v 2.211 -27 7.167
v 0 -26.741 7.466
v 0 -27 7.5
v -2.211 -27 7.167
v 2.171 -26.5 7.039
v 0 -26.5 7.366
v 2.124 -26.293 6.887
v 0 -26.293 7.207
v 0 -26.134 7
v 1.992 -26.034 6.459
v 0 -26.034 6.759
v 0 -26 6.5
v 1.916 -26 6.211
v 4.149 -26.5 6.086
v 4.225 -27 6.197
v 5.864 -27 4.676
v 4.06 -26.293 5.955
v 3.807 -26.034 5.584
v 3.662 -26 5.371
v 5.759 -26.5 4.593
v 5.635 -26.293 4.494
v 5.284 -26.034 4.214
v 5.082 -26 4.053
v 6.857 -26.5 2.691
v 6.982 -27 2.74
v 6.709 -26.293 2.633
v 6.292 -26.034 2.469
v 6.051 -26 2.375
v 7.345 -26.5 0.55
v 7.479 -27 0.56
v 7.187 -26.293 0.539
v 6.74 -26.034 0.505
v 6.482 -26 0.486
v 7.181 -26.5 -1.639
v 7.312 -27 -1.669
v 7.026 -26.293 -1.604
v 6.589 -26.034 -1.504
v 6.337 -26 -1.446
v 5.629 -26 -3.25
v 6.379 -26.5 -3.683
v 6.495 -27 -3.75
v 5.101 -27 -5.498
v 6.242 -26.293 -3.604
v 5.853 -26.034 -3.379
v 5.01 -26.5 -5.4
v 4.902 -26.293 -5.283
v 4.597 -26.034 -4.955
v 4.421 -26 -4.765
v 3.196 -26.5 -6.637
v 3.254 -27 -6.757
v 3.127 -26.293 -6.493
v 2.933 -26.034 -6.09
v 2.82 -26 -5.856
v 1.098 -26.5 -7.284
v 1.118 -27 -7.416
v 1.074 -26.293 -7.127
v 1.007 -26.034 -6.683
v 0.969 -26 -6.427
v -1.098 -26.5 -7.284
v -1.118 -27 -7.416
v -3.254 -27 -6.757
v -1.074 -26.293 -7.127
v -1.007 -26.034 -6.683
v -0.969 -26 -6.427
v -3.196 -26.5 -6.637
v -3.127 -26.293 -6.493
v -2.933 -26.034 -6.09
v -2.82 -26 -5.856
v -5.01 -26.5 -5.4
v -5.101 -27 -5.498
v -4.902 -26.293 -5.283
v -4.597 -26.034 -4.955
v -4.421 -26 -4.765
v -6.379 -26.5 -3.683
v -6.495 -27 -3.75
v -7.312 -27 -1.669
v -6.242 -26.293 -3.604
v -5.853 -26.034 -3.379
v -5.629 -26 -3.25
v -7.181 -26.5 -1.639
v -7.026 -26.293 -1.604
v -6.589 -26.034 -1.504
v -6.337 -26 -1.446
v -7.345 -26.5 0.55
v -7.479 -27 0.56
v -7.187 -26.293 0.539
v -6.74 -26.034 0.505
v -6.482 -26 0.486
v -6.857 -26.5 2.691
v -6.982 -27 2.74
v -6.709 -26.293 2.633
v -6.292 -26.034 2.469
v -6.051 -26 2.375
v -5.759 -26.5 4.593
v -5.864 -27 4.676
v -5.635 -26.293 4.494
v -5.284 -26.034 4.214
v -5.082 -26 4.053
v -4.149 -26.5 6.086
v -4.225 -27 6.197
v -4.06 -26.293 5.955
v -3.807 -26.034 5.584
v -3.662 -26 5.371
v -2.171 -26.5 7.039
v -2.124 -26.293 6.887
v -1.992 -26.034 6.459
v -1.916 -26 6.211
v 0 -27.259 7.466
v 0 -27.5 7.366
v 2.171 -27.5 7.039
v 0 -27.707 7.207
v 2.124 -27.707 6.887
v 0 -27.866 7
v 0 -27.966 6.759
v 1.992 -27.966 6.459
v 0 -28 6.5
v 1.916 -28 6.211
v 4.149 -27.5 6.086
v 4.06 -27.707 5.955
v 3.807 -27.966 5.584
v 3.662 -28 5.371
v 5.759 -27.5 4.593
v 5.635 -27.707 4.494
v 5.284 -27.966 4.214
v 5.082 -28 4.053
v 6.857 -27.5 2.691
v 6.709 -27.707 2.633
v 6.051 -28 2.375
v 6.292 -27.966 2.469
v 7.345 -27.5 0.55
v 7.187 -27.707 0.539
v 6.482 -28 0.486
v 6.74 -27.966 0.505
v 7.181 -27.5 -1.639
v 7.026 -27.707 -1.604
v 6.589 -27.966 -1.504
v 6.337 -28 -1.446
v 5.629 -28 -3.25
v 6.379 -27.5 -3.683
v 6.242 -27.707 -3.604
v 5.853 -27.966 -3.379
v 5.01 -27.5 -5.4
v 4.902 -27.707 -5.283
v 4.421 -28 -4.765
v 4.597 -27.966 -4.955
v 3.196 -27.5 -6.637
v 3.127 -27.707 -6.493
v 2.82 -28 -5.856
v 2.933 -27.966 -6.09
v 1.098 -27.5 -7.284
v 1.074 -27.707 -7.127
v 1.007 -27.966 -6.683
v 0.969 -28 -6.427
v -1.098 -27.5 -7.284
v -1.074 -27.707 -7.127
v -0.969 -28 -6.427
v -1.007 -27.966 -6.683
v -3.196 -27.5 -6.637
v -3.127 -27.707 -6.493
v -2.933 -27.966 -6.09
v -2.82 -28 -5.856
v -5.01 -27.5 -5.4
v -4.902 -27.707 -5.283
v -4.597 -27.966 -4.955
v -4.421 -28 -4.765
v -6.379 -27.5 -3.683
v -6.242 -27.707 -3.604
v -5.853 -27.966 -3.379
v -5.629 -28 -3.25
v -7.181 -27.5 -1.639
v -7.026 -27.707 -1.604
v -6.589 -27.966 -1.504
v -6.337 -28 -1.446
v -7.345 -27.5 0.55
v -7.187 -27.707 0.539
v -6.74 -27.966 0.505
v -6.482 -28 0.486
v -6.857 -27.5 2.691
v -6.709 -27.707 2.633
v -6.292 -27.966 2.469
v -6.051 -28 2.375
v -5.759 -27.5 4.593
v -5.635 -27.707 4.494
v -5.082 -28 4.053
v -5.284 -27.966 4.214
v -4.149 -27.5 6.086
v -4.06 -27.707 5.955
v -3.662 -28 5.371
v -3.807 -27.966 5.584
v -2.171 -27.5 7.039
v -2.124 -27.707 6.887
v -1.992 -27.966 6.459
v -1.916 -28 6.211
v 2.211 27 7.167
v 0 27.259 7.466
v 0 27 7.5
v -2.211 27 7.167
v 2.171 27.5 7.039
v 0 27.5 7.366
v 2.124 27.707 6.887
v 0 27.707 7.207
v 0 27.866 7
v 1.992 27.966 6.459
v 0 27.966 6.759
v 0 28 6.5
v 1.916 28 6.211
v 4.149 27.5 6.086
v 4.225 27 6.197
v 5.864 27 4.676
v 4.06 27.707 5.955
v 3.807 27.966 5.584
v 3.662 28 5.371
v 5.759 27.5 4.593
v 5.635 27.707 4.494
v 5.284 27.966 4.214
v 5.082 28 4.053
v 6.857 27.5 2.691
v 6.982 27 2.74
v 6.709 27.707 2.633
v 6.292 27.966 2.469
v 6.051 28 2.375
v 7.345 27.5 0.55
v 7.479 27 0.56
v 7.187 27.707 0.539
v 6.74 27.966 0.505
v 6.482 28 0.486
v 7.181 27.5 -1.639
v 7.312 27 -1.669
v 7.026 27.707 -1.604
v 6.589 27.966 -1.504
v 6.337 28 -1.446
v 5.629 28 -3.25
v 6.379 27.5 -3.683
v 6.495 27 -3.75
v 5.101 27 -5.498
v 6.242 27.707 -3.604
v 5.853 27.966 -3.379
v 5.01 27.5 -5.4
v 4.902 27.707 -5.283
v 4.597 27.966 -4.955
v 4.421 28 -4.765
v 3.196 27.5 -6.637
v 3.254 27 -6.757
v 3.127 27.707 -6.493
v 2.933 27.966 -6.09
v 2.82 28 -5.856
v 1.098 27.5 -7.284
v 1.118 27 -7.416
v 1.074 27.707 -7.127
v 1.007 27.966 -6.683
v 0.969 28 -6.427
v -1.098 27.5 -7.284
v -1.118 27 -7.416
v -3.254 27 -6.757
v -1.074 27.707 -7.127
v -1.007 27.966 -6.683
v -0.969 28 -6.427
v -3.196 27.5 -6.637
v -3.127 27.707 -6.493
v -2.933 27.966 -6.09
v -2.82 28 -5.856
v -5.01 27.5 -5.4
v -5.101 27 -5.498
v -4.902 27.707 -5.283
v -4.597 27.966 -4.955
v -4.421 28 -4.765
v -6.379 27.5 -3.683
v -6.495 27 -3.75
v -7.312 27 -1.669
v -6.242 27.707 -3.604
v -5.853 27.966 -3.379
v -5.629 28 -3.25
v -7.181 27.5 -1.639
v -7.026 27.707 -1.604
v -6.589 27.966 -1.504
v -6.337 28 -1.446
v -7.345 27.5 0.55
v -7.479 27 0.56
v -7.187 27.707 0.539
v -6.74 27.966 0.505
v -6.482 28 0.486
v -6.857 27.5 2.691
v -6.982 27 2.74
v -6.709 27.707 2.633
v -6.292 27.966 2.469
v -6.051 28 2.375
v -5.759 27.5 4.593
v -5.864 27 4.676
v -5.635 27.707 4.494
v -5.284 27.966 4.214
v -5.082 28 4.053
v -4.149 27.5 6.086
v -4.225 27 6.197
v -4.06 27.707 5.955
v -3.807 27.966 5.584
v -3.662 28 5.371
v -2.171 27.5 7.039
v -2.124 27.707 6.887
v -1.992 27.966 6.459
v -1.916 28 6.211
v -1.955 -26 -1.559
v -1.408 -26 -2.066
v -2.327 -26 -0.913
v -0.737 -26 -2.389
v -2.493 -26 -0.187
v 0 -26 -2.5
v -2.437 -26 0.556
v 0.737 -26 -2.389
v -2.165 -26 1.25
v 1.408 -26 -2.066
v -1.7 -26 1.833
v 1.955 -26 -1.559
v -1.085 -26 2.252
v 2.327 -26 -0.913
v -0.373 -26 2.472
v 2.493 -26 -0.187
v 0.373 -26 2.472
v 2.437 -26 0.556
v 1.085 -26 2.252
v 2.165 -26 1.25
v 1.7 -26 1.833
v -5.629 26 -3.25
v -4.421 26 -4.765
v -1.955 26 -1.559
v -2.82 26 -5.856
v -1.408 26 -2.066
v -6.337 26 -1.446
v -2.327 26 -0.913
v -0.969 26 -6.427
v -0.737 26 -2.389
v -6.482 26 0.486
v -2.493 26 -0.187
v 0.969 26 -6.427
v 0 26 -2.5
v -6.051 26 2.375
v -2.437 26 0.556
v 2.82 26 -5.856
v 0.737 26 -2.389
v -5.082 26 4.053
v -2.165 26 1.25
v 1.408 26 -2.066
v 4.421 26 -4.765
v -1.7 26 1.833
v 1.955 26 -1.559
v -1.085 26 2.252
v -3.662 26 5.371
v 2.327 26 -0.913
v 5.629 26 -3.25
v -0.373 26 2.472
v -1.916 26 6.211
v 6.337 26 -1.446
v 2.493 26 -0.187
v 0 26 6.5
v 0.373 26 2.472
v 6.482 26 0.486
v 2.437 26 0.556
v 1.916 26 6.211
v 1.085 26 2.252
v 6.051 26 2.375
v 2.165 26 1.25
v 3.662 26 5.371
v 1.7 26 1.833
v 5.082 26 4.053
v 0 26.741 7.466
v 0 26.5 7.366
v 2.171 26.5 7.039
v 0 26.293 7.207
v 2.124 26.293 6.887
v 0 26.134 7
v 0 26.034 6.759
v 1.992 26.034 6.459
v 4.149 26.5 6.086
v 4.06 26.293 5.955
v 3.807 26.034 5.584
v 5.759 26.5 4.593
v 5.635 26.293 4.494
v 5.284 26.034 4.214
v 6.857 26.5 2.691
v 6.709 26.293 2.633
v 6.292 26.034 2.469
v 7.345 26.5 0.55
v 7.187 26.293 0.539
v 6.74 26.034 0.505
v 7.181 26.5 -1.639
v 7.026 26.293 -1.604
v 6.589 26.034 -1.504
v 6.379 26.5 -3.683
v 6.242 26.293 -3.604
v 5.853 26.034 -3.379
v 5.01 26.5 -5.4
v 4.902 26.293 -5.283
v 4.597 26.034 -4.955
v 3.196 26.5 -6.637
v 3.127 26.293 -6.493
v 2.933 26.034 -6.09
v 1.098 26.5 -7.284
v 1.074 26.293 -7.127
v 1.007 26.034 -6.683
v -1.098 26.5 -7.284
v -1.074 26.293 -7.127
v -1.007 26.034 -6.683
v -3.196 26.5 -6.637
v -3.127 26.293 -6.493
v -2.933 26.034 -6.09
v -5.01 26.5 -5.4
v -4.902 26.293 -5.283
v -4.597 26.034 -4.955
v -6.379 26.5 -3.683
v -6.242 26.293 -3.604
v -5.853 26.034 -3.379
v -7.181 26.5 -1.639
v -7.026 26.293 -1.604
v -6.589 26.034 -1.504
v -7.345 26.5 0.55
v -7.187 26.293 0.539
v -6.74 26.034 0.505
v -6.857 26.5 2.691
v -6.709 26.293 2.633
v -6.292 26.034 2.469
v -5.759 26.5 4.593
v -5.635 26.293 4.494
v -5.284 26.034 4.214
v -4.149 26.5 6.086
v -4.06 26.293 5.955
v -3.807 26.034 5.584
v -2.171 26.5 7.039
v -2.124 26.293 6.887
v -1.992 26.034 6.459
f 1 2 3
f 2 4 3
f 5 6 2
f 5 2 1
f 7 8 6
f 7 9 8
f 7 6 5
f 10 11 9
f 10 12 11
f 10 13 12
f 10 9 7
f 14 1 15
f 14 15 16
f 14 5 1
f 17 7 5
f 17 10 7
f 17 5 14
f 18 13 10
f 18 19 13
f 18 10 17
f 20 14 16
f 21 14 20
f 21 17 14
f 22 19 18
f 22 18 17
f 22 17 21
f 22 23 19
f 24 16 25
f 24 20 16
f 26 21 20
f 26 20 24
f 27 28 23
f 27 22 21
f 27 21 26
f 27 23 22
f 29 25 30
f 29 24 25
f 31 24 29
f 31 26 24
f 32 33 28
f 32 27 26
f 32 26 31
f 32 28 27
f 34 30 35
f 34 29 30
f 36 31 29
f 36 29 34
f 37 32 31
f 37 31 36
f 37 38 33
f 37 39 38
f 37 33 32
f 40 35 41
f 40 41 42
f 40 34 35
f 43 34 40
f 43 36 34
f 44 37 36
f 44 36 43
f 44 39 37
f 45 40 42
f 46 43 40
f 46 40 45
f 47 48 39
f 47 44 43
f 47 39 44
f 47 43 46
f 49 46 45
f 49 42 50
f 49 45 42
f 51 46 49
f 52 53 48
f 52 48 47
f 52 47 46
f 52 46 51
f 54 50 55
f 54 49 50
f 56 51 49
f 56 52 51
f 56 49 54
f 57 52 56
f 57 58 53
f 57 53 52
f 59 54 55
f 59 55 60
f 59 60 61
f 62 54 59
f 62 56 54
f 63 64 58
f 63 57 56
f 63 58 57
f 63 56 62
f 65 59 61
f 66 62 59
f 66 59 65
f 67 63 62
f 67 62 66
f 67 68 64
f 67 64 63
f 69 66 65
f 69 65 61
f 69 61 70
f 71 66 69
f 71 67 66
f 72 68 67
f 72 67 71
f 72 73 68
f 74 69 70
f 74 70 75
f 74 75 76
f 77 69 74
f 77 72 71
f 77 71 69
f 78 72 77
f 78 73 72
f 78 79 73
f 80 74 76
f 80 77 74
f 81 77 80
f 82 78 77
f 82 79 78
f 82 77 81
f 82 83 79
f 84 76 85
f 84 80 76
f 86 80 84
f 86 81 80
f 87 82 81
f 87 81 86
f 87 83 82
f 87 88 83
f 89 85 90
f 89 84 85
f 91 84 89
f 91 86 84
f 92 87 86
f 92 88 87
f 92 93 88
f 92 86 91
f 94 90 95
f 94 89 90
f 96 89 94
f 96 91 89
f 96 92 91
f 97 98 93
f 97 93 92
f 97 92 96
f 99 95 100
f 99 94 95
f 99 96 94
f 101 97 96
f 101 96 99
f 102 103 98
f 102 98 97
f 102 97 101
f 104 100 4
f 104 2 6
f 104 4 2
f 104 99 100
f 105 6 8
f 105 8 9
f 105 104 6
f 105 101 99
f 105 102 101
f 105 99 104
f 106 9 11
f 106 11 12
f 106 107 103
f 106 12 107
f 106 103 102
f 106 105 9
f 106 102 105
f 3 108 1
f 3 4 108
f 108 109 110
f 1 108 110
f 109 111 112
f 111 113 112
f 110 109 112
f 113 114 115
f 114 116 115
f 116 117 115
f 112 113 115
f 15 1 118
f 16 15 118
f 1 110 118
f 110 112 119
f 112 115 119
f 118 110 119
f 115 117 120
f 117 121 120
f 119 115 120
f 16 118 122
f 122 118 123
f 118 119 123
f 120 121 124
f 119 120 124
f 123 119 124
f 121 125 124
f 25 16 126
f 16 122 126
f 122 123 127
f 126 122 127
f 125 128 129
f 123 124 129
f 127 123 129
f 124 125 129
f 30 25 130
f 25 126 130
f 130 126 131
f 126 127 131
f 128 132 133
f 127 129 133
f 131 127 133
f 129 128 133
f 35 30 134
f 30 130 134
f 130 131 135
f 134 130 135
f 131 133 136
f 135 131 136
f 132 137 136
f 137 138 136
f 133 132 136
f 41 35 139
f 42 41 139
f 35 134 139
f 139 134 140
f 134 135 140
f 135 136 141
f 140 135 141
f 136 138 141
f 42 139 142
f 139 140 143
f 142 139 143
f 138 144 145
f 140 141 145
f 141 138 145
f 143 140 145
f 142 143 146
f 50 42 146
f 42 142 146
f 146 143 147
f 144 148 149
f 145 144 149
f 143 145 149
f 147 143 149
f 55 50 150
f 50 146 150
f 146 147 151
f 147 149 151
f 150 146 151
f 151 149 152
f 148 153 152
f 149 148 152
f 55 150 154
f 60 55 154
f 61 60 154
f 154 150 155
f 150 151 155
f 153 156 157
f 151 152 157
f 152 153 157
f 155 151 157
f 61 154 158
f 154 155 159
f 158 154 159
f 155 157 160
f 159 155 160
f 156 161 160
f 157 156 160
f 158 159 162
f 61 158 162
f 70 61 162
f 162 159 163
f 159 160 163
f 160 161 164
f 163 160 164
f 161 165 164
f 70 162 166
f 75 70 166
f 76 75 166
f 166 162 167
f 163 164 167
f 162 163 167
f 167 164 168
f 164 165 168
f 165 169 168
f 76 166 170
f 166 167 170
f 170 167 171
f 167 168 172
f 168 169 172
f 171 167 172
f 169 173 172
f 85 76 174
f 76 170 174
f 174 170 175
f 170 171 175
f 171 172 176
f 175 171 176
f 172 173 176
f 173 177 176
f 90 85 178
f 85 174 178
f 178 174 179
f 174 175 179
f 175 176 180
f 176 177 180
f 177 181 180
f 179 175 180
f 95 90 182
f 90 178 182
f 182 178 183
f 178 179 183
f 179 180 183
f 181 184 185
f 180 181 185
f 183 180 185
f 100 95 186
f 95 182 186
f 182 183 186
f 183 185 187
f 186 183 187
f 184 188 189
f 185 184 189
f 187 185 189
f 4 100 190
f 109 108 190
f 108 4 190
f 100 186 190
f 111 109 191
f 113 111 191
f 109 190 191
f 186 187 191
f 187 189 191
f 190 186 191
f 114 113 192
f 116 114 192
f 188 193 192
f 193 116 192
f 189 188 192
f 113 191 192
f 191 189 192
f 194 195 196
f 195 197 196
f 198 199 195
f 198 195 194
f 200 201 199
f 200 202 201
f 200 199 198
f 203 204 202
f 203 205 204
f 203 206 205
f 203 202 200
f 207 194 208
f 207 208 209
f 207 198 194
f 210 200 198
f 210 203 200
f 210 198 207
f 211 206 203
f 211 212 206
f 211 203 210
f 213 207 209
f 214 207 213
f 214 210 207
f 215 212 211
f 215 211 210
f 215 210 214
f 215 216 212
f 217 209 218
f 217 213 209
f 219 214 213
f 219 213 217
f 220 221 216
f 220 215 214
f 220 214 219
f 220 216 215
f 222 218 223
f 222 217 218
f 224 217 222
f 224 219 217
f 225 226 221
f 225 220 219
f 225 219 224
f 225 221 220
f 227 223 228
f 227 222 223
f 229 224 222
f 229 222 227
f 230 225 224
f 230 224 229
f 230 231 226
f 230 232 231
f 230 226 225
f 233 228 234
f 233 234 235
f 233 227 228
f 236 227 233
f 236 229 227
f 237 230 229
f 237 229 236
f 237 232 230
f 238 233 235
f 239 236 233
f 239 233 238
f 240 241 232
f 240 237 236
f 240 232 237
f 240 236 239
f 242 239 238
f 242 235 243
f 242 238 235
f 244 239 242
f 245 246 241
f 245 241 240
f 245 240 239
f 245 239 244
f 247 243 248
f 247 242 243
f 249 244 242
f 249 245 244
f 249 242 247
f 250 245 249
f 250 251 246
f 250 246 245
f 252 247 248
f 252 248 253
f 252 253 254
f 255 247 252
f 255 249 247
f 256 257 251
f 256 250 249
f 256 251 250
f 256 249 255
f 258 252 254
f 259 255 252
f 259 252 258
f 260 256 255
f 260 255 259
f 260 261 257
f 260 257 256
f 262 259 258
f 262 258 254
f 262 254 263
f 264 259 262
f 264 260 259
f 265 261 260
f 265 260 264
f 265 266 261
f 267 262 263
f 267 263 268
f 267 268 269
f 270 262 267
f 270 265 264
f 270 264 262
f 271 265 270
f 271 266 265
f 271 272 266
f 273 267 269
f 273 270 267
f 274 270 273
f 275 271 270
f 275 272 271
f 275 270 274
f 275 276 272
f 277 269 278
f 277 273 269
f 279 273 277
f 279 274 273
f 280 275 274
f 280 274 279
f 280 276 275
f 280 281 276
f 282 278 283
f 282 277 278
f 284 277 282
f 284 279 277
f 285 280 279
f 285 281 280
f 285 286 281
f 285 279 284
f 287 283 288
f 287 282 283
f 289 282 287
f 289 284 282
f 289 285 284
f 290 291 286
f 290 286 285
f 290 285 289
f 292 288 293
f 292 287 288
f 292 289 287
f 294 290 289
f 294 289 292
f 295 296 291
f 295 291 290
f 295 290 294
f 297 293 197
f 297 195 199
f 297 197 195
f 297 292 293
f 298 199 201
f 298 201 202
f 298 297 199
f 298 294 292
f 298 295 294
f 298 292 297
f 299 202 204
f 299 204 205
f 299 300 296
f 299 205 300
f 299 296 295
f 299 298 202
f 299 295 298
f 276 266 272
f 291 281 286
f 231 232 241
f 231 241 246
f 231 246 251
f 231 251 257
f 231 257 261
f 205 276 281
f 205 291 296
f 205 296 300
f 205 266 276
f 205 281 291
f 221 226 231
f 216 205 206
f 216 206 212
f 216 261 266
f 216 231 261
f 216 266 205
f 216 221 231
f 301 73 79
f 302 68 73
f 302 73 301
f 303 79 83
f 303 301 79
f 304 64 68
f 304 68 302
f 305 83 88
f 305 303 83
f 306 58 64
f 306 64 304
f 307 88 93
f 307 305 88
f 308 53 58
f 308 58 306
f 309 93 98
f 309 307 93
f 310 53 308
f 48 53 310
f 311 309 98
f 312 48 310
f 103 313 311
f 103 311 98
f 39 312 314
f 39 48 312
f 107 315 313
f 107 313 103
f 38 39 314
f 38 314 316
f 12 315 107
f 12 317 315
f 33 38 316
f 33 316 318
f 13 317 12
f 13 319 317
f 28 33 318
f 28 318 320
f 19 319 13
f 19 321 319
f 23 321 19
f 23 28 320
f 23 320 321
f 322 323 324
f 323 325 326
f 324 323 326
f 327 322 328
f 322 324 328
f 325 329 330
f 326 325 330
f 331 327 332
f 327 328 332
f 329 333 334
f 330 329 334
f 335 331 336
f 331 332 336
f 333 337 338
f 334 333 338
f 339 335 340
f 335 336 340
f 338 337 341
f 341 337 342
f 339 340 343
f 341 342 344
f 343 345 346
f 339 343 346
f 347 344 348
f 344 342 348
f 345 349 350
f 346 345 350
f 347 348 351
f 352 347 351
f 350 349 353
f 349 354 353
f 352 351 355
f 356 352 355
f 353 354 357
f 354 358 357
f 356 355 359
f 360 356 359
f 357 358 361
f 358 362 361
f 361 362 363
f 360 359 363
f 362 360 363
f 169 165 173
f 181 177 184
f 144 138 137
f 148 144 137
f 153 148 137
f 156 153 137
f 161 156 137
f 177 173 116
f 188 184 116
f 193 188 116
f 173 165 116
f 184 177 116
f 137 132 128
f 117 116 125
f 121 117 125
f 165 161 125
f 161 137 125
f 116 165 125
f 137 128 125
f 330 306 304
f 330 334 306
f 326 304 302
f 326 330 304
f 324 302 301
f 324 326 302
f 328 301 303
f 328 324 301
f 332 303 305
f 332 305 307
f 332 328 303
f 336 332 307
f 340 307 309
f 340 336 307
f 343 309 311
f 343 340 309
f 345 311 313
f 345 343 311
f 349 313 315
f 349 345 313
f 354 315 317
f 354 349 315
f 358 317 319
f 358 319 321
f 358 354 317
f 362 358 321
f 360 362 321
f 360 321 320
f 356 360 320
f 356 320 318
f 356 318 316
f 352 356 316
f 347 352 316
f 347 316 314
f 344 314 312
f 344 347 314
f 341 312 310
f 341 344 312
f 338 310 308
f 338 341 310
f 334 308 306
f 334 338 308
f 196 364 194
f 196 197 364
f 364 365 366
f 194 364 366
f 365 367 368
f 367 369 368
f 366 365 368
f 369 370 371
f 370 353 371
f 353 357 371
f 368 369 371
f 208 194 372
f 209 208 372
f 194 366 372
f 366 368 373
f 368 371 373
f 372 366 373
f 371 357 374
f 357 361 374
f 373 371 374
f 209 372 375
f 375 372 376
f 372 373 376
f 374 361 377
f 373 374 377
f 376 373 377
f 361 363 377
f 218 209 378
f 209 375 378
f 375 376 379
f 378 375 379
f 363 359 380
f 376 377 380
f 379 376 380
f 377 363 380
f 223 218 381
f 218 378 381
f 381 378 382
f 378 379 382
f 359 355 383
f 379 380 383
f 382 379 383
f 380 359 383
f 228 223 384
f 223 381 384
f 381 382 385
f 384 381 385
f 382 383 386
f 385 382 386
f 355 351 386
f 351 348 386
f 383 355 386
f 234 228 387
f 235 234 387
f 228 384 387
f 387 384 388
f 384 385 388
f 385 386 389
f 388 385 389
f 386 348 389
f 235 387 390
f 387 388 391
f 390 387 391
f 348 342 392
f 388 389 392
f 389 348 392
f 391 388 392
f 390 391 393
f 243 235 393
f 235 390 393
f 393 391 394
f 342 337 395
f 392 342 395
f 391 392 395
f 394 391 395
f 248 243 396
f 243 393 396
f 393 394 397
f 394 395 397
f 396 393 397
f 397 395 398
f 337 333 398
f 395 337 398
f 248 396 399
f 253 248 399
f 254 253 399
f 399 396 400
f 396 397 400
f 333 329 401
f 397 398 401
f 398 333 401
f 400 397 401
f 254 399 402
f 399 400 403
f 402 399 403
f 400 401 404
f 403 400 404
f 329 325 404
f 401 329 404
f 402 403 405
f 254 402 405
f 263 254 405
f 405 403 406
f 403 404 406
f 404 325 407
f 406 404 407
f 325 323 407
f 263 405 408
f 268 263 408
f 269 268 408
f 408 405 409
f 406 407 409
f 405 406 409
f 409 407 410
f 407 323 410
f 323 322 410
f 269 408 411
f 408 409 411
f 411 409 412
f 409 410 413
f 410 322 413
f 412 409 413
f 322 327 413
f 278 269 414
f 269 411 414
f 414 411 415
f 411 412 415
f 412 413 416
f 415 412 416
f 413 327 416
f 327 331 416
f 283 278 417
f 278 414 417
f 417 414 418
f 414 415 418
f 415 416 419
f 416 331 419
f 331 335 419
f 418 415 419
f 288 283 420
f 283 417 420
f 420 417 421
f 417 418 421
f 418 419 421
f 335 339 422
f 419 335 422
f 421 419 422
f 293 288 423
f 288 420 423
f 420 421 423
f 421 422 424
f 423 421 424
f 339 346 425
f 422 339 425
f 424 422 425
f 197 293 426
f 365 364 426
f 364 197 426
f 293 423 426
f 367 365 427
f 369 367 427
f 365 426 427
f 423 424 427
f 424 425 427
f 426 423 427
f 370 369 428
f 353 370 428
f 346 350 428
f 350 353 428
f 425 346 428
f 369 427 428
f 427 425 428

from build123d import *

# Parameters (mm, degrees)
SKETCH1_R           = 2.5
BOSS_EXTRUDE1_DEPTH = 26
SKETCH2_R           = 7.5
BOSS_EXTRUDE2_DEPTH = 2
FILLET1_R           = 1


with BuildPart() as part:
    # Sketch1 → Boss-Extrude1 (new body)
    with BuildSketch(Plane(origin=(0, 0, 0), x_dir=(1, 0, 0), z_dir=(0, 1, 0))):
        with Locations(Location((0, 0, 0), (0, 0, 90))):
            Circle(SKETCH1_R)
    extrude(amount=BOSS_EXTRUDE1_DEPTH)

    # Sketch2 → Boss-Extrude2 (add)
    with BuildSketch(Plane(origin=(0, 26, 0), x_dir=(1, 0, 0), z_dir=(0, 1, 0))):
        with Locations(Location((0, 0, 0), (0, 0, 270))):
            Circle(SKETCH2_R)
    extrude(amount=BOSS_EXTRUDE2_DEPTH)

    # Fillet1
    fillet1_edges = [part.edges().sort_by_distance(p)[0] for p in [
        (0, 26, -7.5),
        (0, 28, -7.5),
    ]]
    fillet(fillet1_edges, radius=FILLET1_R - 0.0001)  # a hair under: the kernel refuses the full size

    # Mirror1: part across plane


with BuildPart() as part_1:
    add(part.part)
    add(part.part.mirror(Plane.ZX))


solid = part_1.part
